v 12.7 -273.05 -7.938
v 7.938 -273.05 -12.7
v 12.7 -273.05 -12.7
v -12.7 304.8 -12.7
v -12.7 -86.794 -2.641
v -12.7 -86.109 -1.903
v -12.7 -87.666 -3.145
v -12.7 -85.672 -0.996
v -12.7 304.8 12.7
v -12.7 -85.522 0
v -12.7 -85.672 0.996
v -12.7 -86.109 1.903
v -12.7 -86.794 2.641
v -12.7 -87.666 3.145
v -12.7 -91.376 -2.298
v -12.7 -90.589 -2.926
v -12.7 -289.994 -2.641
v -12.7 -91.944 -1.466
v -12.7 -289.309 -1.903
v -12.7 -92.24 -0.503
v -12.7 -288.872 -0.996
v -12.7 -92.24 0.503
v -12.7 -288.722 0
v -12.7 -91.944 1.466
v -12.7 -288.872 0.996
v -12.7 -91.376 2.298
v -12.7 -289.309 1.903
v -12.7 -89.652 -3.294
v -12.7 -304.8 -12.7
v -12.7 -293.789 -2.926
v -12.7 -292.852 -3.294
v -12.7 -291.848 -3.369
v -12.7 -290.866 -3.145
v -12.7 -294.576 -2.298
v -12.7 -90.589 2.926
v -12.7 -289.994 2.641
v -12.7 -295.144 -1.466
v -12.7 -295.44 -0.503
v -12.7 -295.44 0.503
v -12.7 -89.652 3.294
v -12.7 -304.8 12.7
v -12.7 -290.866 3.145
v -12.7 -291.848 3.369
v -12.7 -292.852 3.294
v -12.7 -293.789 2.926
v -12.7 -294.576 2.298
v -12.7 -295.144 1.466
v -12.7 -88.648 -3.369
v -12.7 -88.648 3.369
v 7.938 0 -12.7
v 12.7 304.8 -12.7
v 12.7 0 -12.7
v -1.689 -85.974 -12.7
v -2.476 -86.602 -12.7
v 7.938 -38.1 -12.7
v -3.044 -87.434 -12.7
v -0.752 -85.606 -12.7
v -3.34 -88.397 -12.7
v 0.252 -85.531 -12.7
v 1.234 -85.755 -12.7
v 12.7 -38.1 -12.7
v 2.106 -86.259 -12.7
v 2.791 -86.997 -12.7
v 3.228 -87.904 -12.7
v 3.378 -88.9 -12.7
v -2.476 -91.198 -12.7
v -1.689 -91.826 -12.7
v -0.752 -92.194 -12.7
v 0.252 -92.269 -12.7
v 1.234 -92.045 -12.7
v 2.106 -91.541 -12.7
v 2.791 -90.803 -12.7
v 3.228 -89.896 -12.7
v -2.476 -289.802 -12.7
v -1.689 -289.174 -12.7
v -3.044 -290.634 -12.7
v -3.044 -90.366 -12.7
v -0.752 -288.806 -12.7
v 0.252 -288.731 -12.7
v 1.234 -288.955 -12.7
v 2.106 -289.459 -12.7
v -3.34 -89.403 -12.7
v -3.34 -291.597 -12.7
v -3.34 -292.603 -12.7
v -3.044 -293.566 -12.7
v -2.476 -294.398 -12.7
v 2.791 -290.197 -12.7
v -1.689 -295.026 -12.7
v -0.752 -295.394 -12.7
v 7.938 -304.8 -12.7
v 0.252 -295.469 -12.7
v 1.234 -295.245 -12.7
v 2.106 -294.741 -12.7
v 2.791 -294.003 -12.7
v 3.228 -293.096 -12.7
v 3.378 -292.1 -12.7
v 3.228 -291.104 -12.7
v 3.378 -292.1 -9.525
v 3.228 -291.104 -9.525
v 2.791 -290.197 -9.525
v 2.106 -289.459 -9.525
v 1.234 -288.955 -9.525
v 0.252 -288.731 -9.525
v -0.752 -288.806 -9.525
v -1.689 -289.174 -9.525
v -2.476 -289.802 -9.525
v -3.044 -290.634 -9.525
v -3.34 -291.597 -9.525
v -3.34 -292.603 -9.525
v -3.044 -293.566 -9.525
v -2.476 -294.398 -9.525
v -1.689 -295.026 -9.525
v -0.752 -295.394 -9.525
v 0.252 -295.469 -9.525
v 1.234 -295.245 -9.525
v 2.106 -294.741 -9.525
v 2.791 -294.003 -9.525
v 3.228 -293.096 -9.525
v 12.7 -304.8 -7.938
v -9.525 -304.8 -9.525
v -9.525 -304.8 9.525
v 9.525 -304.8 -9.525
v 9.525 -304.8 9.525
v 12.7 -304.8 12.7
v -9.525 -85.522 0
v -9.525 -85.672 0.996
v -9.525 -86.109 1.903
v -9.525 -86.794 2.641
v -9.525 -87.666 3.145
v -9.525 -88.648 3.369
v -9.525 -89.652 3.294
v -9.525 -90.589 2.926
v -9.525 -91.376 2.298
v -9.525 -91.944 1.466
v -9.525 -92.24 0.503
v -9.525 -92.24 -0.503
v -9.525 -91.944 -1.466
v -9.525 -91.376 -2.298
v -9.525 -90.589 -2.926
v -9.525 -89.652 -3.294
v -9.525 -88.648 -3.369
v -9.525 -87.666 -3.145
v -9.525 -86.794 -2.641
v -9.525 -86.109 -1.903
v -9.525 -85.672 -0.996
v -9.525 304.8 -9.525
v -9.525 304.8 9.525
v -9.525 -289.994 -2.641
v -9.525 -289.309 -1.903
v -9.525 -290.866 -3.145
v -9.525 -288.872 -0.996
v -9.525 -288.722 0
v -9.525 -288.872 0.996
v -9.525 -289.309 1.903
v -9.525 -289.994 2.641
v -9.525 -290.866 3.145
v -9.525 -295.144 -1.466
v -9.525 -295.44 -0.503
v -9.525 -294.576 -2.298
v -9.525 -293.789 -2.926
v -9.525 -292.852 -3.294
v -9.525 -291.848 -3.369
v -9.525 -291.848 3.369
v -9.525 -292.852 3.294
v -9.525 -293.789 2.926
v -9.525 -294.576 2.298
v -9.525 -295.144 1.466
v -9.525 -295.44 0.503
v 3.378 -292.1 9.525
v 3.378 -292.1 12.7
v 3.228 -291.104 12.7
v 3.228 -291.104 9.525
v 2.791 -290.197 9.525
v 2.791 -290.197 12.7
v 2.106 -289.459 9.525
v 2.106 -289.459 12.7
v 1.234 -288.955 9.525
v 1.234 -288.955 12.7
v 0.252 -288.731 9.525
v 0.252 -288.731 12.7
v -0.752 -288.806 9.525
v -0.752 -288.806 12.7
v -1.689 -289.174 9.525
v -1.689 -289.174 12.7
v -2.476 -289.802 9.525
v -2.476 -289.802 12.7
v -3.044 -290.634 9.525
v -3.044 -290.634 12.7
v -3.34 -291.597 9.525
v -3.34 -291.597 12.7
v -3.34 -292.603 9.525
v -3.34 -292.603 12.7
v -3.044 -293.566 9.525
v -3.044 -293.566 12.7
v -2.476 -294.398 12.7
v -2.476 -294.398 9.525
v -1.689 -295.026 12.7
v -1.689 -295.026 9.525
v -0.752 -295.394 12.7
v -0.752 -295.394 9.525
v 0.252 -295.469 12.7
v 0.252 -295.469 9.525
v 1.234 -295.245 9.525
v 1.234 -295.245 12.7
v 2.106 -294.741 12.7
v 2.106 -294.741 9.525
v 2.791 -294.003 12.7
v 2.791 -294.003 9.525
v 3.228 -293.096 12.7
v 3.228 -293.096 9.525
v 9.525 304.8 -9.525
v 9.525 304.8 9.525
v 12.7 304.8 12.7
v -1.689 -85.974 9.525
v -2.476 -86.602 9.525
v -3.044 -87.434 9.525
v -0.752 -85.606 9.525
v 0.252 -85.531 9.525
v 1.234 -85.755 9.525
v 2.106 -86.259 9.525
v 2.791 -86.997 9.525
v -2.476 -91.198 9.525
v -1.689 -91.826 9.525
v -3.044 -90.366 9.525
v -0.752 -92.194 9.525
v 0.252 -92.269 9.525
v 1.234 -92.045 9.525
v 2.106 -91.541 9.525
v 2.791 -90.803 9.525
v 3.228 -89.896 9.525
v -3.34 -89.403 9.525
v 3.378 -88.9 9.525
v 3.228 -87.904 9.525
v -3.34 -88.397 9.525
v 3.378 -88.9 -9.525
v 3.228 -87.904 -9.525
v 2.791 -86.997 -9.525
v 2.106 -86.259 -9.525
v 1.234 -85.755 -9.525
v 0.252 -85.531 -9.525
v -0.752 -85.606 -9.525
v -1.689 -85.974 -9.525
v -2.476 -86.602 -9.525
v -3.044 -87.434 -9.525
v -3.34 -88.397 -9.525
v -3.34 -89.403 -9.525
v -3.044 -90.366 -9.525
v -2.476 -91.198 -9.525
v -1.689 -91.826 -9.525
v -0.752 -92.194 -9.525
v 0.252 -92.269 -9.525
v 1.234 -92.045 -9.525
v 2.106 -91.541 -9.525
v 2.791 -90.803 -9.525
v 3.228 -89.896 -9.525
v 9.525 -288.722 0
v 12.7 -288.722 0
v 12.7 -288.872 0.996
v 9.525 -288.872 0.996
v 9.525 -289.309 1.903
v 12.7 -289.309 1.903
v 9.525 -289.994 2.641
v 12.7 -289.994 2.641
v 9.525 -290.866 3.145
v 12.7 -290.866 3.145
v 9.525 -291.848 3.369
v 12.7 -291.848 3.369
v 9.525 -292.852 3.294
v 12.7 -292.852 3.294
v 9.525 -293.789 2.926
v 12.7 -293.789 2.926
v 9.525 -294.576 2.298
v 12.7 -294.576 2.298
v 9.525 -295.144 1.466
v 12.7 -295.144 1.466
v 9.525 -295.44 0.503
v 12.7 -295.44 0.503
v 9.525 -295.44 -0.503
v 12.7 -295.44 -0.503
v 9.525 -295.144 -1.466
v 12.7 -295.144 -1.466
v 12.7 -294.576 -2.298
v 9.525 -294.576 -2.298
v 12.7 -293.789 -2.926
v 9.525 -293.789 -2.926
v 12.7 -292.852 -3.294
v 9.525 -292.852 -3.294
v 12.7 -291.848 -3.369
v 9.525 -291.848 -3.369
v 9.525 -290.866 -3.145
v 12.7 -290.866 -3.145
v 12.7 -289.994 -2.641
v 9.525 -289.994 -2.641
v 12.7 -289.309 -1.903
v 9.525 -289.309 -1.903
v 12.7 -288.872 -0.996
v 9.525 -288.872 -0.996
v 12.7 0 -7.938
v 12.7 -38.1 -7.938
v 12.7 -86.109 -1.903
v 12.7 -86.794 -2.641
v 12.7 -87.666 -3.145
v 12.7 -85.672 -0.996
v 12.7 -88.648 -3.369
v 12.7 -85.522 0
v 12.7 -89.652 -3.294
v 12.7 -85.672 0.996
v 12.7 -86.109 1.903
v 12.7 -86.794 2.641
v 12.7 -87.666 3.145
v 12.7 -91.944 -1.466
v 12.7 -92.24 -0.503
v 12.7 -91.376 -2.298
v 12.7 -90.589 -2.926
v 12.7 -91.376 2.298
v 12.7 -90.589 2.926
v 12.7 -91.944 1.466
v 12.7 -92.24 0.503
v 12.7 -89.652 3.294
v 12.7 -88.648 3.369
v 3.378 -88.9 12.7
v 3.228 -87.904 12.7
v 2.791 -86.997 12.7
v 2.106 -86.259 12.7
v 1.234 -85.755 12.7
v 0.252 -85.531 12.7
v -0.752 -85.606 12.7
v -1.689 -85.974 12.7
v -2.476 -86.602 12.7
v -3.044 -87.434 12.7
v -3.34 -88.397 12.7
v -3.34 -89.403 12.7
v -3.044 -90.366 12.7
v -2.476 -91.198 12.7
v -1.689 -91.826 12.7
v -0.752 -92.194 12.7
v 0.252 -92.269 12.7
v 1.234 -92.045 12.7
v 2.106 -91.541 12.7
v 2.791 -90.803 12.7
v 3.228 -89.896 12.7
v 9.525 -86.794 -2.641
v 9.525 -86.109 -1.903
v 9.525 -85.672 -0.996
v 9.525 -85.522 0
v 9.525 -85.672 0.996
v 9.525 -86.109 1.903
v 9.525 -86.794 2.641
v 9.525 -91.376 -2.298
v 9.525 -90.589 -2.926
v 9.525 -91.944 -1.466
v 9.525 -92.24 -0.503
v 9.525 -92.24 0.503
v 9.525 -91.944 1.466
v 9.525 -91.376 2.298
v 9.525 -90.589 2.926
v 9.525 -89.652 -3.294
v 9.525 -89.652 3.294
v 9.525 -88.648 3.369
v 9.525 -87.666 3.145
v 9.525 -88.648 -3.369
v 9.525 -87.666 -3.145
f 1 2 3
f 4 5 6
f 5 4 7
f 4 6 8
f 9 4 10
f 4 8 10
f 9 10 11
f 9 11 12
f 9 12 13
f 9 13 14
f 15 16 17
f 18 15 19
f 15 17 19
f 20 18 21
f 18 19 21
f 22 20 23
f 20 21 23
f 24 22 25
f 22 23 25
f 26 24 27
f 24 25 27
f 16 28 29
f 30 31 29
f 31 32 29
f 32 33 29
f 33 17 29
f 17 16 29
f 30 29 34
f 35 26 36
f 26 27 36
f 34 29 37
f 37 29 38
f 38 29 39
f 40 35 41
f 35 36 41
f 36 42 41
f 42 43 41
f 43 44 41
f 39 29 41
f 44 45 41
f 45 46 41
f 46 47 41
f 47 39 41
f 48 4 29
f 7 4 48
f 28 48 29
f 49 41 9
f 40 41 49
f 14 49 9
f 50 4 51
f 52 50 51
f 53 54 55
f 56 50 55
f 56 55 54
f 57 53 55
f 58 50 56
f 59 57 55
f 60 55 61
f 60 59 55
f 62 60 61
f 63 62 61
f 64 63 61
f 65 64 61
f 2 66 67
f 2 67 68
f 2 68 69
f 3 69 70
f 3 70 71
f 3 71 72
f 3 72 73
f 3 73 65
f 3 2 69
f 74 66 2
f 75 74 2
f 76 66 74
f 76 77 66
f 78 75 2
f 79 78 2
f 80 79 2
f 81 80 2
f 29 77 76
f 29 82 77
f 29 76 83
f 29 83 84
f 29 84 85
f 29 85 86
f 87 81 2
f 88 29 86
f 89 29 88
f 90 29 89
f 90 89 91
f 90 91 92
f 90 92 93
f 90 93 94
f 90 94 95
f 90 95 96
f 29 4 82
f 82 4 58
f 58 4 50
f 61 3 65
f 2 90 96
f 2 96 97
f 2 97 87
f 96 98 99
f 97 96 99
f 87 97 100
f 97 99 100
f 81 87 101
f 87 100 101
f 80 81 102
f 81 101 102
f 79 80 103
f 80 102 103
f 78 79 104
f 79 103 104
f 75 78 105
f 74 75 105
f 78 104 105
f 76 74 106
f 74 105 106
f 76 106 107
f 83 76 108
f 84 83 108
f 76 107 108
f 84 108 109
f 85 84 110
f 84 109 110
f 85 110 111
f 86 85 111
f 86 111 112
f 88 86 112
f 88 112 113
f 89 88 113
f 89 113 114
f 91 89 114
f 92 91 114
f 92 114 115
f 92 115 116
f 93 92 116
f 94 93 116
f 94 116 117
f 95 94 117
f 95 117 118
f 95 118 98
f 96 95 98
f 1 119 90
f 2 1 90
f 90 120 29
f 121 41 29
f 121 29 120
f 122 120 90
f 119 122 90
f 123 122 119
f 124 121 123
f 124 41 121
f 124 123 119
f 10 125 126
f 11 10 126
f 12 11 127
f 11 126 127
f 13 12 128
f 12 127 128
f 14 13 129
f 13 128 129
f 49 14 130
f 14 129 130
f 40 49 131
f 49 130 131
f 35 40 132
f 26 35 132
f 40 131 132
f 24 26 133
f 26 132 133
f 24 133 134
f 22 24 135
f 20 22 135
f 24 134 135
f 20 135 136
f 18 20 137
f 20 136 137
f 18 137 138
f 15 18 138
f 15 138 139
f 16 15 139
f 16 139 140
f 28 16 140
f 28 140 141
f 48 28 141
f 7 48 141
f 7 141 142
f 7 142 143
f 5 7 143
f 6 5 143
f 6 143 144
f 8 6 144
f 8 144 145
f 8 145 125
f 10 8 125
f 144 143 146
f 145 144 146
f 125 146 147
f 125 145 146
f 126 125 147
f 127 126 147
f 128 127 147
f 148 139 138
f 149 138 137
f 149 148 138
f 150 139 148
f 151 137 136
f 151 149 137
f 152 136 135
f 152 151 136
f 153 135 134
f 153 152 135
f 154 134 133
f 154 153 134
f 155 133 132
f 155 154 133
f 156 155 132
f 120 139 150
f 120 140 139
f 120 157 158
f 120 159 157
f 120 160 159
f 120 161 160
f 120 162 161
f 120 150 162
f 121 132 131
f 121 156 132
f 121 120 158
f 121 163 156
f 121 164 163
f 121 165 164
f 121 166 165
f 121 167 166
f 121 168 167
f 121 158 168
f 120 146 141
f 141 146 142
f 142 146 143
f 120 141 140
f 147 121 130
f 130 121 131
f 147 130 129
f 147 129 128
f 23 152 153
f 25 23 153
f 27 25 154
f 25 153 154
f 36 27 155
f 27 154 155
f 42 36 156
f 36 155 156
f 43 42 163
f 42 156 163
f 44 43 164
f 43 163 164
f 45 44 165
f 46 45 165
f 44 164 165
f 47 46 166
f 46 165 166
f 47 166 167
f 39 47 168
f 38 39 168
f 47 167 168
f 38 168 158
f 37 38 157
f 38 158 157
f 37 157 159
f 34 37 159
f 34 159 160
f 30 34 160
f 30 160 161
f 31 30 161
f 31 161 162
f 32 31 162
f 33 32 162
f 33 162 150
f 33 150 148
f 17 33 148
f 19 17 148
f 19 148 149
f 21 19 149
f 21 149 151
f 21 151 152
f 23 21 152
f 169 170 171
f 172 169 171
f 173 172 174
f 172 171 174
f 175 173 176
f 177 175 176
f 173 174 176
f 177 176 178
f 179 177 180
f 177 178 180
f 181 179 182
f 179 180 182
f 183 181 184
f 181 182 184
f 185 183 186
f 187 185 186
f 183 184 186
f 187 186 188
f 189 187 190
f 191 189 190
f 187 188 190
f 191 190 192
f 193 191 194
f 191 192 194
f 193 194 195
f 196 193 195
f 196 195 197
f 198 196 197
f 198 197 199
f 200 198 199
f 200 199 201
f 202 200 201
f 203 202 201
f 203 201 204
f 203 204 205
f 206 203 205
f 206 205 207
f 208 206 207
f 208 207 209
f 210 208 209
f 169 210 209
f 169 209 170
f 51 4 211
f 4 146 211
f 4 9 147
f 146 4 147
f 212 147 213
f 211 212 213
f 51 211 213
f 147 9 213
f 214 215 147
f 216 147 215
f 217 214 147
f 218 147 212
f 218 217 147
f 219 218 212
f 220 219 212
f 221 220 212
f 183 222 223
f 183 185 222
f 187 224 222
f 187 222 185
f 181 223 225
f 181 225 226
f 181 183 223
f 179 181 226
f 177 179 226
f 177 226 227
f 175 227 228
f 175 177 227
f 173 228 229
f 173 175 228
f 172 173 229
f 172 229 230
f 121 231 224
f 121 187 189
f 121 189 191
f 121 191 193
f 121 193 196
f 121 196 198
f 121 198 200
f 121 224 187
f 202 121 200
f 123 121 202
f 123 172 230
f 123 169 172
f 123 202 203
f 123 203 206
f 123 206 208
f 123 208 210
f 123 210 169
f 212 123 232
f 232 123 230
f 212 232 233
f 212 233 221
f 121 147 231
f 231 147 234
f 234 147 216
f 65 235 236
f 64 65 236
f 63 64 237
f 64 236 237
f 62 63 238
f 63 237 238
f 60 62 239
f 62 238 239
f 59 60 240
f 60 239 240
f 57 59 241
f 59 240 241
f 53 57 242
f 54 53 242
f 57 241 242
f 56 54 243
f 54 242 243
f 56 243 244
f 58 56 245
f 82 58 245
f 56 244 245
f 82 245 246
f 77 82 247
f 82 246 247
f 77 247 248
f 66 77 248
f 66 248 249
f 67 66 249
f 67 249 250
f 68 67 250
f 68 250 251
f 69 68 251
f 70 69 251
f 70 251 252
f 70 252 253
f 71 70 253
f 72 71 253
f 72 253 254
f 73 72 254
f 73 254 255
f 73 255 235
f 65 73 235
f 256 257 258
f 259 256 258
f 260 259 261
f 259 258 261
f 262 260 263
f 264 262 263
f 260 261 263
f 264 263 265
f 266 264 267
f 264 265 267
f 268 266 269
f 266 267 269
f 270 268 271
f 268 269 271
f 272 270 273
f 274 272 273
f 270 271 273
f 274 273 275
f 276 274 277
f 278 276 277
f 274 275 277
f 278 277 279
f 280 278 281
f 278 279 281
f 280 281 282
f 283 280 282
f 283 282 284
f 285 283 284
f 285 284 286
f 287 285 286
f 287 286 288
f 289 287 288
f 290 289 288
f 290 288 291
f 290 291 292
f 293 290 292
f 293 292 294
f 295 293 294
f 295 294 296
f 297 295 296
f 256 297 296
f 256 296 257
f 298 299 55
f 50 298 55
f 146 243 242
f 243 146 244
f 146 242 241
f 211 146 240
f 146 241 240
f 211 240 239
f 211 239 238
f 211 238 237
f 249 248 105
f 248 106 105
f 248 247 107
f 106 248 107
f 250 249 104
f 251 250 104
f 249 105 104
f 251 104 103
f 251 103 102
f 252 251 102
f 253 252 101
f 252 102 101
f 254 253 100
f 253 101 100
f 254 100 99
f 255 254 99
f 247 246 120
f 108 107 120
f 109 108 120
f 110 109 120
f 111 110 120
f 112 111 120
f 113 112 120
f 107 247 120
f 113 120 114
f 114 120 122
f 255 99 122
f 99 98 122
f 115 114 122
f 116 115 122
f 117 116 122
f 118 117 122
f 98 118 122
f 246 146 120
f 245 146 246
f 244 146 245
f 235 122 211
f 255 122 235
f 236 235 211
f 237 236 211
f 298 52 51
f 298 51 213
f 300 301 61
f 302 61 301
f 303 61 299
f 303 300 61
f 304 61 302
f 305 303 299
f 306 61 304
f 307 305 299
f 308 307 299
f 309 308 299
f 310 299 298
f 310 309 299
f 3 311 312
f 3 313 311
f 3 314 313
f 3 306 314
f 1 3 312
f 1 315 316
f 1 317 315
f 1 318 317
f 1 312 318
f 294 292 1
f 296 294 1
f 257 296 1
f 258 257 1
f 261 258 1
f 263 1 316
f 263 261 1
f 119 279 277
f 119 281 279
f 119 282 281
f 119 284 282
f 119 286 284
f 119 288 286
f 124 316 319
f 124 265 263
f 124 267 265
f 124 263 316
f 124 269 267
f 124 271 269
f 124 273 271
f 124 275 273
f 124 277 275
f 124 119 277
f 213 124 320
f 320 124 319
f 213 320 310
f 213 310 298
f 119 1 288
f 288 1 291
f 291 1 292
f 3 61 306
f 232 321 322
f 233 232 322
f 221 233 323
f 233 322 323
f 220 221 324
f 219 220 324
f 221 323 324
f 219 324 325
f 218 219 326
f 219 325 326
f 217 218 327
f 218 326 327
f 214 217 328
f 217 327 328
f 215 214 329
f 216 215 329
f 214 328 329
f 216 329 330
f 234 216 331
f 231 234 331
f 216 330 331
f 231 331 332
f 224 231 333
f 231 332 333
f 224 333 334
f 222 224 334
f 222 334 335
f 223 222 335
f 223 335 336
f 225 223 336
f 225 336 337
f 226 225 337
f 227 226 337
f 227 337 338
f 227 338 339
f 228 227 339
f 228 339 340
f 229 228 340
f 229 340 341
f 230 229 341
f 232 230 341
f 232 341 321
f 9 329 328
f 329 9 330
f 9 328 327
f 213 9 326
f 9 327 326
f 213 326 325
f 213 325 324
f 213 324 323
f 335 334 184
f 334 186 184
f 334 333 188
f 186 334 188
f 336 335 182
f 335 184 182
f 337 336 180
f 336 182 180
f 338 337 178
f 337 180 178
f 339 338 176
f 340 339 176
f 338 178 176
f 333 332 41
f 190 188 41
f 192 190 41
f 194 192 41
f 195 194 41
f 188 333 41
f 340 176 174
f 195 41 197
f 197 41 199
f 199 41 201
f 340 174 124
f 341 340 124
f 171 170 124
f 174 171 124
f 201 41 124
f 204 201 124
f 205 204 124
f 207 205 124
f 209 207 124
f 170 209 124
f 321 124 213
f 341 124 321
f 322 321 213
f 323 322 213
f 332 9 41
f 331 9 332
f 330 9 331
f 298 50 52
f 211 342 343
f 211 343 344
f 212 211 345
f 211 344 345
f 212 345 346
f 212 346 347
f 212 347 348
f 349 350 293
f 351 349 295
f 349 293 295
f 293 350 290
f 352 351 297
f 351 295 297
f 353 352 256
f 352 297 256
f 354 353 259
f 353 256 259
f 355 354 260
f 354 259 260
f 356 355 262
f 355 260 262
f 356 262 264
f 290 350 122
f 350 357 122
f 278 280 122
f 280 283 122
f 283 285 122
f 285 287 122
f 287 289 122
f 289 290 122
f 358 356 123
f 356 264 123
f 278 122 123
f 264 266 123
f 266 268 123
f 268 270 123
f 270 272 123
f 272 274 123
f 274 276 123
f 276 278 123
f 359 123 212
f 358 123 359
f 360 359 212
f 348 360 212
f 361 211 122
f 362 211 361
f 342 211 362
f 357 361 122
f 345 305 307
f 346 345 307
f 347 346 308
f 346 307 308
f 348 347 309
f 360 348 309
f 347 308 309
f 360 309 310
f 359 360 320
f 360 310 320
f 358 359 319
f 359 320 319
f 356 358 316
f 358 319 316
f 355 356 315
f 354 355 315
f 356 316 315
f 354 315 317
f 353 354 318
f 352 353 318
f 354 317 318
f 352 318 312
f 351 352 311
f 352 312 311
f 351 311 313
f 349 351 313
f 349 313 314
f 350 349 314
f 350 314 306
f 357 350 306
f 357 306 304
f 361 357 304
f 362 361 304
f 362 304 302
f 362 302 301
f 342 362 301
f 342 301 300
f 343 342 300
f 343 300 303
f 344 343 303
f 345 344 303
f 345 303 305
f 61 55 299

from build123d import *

# Parameters (mm, degrees)
F0_W      = 25.4
F0_H      = 25.4
F0_W_2    = 19.05
F0_H_2    = 19.05
F1_DEPTH  = 304.8
F2_R      = 3.3782
F3_DEPTH  = 25.4
F4_R      = 3.3782
F5_DEPTH  = 25.4
F7_DEPTH  = 31.75
F10_DEPTH = 38.1


with BuildPart() as f1:
    # F0 (on Front) → F1 (new body, symmetric)
    with BuildSketch(Plane.XZ):
        Rectangle(F0_W, F0_H)
        Rectangle(F0_W_2, F0_H_2, mode=Mode.SUBTRACT)
    extrude(amount=F1_DEPTH, both=True)

    # F2 (on face) → F3 (cut, through all)
    with BuildSketch(Plane.XY.offset(12.7)):
        with Locations((0, -292.1)):
            Circle(F2_R)
        with Locations((0, -88.9)):
            Circle(F2_R)
    extrude(amount=-F3_DEPTH, mode=Mode.SUBTRACT)

    # F4 (on face) → F5 (cut, through all)
    with BuildSketch(Plane.YZ.offset(12.7)):
        with Locations((-292.1, 0)):
            Circle(F4_R)
        with Locations((-88.9, 0)):
            Circle(F4_R)
    extrude(amount=-F5_DEPTH, mode=Mode.SUBTRACT)

    # F6 (on face) → F7 (cut)
    with BuildSketch(Plane.XZ.offset(304.8)):
        Polygon((12.7, -12.7), (12.7, -7.9375), (7.9375, -12.7), align=None)
    extrude(amount=-F7_DEPTH, mode=Mode.SUBTRACT)

    # F9 (on offset) → F10 (cut)
    with BuildSketch(Plane.XZ.offset(38.1)):
        Polygon((12.7, -12.7), (12.7, -7.9375), (7.9375, -12.7), align=None)
    extrude(amount=-F10_DEPTH, mode=Mode.SUBTRACT)


solid = f1.part
